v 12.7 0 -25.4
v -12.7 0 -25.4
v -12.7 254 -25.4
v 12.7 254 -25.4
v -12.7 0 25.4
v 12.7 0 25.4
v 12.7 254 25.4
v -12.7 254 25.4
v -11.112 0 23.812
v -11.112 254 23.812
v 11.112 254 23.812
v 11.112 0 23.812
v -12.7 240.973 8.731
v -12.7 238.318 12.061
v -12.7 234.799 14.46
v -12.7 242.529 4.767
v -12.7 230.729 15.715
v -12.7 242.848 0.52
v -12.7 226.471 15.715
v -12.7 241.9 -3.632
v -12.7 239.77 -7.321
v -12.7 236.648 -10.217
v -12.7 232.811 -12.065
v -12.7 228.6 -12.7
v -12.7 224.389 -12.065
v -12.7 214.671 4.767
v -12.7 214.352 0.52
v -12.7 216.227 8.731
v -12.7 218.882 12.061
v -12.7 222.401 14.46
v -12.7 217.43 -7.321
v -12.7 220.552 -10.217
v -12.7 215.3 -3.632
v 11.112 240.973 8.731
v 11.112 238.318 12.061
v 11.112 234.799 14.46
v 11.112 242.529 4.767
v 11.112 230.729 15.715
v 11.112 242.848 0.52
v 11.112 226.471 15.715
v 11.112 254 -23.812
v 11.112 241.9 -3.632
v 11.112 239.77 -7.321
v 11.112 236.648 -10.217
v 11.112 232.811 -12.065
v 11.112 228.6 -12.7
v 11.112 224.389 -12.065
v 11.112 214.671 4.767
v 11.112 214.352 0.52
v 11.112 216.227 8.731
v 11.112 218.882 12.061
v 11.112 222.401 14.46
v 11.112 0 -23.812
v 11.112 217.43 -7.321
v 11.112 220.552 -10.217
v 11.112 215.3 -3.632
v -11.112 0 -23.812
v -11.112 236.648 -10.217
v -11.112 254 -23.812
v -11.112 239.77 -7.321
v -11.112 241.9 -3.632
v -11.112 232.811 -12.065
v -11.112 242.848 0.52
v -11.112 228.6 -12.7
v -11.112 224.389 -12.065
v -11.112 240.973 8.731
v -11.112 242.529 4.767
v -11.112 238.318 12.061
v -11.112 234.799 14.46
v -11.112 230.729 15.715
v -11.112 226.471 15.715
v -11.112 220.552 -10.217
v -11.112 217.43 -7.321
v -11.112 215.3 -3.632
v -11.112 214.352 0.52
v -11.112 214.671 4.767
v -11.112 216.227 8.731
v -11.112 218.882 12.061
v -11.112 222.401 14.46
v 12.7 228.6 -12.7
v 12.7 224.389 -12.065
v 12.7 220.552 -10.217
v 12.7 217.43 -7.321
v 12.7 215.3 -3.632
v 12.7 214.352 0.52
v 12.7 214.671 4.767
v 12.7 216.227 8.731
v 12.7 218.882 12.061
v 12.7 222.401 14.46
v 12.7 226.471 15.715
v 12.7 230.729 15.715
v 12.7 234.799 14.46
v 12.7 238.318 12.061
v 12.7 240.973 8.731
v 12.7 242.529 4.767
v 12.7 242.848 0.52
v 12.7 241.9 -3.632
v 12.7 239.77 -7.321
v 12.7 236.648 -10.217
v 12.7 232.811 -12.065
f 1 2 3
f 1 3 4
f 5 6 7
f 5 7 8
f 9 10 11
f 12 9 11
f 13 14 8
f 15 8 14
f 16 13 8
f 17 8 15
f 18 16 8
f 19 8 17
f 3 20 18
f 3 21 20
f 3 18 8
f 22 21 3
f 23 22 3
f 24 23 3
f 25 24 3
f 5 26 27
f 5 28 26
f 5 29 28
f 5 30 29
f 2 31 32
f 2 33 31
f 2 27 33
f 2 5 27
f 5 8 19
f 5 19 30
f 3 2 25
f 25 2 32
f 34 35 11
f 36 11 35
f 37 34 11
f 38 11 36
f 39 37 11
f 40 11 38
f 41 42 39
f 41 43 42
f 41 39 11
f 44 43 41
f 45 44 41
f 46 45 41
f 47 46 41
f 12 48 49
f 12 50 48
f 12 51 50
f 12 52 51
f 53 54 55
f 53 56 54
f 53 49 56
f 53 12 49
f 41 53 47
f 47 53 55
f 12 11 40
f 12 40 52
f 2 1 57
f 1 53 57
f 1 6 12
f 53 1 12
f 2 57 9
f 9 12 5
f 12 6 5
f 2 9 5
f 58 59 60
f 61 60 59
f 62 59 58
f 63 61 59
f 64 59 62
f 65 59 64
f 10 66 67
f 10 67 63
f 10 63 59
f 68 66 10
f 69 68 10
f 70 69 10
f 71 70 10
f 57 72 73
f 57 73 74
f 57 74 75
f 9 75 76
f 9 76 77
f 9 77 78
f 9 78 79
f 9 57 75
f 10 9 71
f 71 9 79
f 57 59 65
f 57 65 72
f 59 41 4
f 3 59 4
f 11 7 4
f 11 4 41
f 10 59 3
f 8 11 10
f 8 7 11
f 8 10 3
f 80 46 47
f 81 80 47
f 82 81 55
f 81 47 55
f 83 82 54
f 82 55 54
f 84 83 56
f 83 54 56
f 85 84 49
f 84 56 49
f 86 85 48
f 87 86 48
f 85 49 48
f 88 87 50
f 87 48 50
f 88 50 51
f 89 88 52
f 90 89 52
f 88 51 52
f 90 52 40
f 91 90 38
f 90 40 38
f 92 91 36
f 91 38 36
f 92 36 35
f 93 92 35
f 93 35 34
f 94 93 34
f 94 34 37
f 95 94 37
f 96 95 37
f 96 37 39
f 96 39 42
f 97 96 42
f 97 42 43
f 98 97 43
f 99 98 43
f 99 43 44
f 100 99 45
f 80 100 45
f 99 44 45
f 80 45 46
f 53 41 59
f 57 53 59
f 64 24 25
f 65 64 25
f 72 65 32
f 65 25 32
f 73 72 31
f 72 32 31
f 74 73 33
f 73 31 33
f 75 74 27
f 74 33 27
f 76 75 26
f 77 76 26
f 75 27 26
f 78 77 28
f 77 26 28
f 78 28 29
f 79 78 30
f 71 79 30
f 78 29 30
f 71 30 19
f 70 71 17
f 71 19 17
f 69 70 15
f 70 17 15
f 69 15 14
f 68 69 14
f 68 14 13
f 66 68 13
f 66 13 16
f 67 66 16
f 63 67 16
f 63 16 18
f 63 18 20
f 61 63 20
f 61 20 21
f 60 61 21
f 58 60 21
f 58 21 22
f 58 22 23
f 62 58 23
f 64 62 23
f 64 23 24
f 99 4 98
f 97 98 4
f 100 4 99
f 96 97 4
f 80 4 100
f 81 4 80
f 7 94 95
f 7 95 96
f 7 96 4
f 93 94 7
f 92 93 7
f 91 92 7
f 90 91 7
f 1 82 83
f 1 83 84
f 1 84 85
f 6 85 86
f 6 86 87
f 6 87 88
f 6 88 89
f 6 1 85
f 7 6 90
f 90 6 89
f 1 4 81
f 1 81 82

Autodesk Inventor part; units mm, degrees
ref_plane "YZ Plane" through (0, 0, 0) normal (1, 0, 0) x (0, 1, 0)
ref_plane "XZ Plane" through (0, 0, 0) normal (0, 1, 0) x (-1, 0, 0)
ref_plane "XY Plane" through (0, 0, 0) normal (0, 0, 1) x (1, 0, 0)
sketch "Sketch1" plane through (0, 0, 0) normal (0, 1, 0) x (-1, 0, 0)
  line L0 (-12.7, 25.4) -> (12.7, 25.4)
  line L1 (12.7, 25.4) -> (12.7, -25.4)
  line L2 (12.7, -25.4) -> (-12.7, -25.4)
  line L3 (-12.7, -25.4) -> (-12.7, 25.4)
  line L4 (-12.7, 25.4) -> (12.7, -25.4) construction
  line L5 (12.7, 25.4) -> (-12.7, -25.4) construction
  line L6 (11.1125, 23.8125) -> (-11.1125, 23.8125)
  line L7 (-11.1125, 23.8125) -> (-11.1125, -23.8125)
  line L8 (-11.1125, -23.8125) -> (11.1125, -23.8125)
  line L9 (11.1125, -23.8125) -> (11.1125, 23.8125)
  line L10 (11.1125, 23.8125) -> (-11.1125, -23.8125) construction
  line L11 (-11.1125, 23.8125) -> (11.1125, -23.8125) construction
  point P0 (0, 0)
  dimension "d0" = 25.4
  dimension "d1" = 50.8
  dimension "d2" = 22.225
  dimension "d3" = 47.625
extrude "Extrusion1" add sketch "Sketch1" along normal blind 254
sketch "Sketch2" plane through (12.7, 0, 25.4) normal (1, 0, 0) x (0, 0, -1)
  line L0 (0, 254) -> (50.8, 254) projected
  line L1 (49.2125, 0) -> (49.2125, 254) projected
  point P0 (25.4, 0)
  point P1 (23.8125, 228.6)
  dimension "d13" = 25.4
  dimension "d14" = 25.4
hole "Hole1" at (12.7, 228.6, 1.5875) direction (-1, 0, 0) diameter 28.575 end through all
properties part number "2x1 Top" material "Aluminum 6061"
